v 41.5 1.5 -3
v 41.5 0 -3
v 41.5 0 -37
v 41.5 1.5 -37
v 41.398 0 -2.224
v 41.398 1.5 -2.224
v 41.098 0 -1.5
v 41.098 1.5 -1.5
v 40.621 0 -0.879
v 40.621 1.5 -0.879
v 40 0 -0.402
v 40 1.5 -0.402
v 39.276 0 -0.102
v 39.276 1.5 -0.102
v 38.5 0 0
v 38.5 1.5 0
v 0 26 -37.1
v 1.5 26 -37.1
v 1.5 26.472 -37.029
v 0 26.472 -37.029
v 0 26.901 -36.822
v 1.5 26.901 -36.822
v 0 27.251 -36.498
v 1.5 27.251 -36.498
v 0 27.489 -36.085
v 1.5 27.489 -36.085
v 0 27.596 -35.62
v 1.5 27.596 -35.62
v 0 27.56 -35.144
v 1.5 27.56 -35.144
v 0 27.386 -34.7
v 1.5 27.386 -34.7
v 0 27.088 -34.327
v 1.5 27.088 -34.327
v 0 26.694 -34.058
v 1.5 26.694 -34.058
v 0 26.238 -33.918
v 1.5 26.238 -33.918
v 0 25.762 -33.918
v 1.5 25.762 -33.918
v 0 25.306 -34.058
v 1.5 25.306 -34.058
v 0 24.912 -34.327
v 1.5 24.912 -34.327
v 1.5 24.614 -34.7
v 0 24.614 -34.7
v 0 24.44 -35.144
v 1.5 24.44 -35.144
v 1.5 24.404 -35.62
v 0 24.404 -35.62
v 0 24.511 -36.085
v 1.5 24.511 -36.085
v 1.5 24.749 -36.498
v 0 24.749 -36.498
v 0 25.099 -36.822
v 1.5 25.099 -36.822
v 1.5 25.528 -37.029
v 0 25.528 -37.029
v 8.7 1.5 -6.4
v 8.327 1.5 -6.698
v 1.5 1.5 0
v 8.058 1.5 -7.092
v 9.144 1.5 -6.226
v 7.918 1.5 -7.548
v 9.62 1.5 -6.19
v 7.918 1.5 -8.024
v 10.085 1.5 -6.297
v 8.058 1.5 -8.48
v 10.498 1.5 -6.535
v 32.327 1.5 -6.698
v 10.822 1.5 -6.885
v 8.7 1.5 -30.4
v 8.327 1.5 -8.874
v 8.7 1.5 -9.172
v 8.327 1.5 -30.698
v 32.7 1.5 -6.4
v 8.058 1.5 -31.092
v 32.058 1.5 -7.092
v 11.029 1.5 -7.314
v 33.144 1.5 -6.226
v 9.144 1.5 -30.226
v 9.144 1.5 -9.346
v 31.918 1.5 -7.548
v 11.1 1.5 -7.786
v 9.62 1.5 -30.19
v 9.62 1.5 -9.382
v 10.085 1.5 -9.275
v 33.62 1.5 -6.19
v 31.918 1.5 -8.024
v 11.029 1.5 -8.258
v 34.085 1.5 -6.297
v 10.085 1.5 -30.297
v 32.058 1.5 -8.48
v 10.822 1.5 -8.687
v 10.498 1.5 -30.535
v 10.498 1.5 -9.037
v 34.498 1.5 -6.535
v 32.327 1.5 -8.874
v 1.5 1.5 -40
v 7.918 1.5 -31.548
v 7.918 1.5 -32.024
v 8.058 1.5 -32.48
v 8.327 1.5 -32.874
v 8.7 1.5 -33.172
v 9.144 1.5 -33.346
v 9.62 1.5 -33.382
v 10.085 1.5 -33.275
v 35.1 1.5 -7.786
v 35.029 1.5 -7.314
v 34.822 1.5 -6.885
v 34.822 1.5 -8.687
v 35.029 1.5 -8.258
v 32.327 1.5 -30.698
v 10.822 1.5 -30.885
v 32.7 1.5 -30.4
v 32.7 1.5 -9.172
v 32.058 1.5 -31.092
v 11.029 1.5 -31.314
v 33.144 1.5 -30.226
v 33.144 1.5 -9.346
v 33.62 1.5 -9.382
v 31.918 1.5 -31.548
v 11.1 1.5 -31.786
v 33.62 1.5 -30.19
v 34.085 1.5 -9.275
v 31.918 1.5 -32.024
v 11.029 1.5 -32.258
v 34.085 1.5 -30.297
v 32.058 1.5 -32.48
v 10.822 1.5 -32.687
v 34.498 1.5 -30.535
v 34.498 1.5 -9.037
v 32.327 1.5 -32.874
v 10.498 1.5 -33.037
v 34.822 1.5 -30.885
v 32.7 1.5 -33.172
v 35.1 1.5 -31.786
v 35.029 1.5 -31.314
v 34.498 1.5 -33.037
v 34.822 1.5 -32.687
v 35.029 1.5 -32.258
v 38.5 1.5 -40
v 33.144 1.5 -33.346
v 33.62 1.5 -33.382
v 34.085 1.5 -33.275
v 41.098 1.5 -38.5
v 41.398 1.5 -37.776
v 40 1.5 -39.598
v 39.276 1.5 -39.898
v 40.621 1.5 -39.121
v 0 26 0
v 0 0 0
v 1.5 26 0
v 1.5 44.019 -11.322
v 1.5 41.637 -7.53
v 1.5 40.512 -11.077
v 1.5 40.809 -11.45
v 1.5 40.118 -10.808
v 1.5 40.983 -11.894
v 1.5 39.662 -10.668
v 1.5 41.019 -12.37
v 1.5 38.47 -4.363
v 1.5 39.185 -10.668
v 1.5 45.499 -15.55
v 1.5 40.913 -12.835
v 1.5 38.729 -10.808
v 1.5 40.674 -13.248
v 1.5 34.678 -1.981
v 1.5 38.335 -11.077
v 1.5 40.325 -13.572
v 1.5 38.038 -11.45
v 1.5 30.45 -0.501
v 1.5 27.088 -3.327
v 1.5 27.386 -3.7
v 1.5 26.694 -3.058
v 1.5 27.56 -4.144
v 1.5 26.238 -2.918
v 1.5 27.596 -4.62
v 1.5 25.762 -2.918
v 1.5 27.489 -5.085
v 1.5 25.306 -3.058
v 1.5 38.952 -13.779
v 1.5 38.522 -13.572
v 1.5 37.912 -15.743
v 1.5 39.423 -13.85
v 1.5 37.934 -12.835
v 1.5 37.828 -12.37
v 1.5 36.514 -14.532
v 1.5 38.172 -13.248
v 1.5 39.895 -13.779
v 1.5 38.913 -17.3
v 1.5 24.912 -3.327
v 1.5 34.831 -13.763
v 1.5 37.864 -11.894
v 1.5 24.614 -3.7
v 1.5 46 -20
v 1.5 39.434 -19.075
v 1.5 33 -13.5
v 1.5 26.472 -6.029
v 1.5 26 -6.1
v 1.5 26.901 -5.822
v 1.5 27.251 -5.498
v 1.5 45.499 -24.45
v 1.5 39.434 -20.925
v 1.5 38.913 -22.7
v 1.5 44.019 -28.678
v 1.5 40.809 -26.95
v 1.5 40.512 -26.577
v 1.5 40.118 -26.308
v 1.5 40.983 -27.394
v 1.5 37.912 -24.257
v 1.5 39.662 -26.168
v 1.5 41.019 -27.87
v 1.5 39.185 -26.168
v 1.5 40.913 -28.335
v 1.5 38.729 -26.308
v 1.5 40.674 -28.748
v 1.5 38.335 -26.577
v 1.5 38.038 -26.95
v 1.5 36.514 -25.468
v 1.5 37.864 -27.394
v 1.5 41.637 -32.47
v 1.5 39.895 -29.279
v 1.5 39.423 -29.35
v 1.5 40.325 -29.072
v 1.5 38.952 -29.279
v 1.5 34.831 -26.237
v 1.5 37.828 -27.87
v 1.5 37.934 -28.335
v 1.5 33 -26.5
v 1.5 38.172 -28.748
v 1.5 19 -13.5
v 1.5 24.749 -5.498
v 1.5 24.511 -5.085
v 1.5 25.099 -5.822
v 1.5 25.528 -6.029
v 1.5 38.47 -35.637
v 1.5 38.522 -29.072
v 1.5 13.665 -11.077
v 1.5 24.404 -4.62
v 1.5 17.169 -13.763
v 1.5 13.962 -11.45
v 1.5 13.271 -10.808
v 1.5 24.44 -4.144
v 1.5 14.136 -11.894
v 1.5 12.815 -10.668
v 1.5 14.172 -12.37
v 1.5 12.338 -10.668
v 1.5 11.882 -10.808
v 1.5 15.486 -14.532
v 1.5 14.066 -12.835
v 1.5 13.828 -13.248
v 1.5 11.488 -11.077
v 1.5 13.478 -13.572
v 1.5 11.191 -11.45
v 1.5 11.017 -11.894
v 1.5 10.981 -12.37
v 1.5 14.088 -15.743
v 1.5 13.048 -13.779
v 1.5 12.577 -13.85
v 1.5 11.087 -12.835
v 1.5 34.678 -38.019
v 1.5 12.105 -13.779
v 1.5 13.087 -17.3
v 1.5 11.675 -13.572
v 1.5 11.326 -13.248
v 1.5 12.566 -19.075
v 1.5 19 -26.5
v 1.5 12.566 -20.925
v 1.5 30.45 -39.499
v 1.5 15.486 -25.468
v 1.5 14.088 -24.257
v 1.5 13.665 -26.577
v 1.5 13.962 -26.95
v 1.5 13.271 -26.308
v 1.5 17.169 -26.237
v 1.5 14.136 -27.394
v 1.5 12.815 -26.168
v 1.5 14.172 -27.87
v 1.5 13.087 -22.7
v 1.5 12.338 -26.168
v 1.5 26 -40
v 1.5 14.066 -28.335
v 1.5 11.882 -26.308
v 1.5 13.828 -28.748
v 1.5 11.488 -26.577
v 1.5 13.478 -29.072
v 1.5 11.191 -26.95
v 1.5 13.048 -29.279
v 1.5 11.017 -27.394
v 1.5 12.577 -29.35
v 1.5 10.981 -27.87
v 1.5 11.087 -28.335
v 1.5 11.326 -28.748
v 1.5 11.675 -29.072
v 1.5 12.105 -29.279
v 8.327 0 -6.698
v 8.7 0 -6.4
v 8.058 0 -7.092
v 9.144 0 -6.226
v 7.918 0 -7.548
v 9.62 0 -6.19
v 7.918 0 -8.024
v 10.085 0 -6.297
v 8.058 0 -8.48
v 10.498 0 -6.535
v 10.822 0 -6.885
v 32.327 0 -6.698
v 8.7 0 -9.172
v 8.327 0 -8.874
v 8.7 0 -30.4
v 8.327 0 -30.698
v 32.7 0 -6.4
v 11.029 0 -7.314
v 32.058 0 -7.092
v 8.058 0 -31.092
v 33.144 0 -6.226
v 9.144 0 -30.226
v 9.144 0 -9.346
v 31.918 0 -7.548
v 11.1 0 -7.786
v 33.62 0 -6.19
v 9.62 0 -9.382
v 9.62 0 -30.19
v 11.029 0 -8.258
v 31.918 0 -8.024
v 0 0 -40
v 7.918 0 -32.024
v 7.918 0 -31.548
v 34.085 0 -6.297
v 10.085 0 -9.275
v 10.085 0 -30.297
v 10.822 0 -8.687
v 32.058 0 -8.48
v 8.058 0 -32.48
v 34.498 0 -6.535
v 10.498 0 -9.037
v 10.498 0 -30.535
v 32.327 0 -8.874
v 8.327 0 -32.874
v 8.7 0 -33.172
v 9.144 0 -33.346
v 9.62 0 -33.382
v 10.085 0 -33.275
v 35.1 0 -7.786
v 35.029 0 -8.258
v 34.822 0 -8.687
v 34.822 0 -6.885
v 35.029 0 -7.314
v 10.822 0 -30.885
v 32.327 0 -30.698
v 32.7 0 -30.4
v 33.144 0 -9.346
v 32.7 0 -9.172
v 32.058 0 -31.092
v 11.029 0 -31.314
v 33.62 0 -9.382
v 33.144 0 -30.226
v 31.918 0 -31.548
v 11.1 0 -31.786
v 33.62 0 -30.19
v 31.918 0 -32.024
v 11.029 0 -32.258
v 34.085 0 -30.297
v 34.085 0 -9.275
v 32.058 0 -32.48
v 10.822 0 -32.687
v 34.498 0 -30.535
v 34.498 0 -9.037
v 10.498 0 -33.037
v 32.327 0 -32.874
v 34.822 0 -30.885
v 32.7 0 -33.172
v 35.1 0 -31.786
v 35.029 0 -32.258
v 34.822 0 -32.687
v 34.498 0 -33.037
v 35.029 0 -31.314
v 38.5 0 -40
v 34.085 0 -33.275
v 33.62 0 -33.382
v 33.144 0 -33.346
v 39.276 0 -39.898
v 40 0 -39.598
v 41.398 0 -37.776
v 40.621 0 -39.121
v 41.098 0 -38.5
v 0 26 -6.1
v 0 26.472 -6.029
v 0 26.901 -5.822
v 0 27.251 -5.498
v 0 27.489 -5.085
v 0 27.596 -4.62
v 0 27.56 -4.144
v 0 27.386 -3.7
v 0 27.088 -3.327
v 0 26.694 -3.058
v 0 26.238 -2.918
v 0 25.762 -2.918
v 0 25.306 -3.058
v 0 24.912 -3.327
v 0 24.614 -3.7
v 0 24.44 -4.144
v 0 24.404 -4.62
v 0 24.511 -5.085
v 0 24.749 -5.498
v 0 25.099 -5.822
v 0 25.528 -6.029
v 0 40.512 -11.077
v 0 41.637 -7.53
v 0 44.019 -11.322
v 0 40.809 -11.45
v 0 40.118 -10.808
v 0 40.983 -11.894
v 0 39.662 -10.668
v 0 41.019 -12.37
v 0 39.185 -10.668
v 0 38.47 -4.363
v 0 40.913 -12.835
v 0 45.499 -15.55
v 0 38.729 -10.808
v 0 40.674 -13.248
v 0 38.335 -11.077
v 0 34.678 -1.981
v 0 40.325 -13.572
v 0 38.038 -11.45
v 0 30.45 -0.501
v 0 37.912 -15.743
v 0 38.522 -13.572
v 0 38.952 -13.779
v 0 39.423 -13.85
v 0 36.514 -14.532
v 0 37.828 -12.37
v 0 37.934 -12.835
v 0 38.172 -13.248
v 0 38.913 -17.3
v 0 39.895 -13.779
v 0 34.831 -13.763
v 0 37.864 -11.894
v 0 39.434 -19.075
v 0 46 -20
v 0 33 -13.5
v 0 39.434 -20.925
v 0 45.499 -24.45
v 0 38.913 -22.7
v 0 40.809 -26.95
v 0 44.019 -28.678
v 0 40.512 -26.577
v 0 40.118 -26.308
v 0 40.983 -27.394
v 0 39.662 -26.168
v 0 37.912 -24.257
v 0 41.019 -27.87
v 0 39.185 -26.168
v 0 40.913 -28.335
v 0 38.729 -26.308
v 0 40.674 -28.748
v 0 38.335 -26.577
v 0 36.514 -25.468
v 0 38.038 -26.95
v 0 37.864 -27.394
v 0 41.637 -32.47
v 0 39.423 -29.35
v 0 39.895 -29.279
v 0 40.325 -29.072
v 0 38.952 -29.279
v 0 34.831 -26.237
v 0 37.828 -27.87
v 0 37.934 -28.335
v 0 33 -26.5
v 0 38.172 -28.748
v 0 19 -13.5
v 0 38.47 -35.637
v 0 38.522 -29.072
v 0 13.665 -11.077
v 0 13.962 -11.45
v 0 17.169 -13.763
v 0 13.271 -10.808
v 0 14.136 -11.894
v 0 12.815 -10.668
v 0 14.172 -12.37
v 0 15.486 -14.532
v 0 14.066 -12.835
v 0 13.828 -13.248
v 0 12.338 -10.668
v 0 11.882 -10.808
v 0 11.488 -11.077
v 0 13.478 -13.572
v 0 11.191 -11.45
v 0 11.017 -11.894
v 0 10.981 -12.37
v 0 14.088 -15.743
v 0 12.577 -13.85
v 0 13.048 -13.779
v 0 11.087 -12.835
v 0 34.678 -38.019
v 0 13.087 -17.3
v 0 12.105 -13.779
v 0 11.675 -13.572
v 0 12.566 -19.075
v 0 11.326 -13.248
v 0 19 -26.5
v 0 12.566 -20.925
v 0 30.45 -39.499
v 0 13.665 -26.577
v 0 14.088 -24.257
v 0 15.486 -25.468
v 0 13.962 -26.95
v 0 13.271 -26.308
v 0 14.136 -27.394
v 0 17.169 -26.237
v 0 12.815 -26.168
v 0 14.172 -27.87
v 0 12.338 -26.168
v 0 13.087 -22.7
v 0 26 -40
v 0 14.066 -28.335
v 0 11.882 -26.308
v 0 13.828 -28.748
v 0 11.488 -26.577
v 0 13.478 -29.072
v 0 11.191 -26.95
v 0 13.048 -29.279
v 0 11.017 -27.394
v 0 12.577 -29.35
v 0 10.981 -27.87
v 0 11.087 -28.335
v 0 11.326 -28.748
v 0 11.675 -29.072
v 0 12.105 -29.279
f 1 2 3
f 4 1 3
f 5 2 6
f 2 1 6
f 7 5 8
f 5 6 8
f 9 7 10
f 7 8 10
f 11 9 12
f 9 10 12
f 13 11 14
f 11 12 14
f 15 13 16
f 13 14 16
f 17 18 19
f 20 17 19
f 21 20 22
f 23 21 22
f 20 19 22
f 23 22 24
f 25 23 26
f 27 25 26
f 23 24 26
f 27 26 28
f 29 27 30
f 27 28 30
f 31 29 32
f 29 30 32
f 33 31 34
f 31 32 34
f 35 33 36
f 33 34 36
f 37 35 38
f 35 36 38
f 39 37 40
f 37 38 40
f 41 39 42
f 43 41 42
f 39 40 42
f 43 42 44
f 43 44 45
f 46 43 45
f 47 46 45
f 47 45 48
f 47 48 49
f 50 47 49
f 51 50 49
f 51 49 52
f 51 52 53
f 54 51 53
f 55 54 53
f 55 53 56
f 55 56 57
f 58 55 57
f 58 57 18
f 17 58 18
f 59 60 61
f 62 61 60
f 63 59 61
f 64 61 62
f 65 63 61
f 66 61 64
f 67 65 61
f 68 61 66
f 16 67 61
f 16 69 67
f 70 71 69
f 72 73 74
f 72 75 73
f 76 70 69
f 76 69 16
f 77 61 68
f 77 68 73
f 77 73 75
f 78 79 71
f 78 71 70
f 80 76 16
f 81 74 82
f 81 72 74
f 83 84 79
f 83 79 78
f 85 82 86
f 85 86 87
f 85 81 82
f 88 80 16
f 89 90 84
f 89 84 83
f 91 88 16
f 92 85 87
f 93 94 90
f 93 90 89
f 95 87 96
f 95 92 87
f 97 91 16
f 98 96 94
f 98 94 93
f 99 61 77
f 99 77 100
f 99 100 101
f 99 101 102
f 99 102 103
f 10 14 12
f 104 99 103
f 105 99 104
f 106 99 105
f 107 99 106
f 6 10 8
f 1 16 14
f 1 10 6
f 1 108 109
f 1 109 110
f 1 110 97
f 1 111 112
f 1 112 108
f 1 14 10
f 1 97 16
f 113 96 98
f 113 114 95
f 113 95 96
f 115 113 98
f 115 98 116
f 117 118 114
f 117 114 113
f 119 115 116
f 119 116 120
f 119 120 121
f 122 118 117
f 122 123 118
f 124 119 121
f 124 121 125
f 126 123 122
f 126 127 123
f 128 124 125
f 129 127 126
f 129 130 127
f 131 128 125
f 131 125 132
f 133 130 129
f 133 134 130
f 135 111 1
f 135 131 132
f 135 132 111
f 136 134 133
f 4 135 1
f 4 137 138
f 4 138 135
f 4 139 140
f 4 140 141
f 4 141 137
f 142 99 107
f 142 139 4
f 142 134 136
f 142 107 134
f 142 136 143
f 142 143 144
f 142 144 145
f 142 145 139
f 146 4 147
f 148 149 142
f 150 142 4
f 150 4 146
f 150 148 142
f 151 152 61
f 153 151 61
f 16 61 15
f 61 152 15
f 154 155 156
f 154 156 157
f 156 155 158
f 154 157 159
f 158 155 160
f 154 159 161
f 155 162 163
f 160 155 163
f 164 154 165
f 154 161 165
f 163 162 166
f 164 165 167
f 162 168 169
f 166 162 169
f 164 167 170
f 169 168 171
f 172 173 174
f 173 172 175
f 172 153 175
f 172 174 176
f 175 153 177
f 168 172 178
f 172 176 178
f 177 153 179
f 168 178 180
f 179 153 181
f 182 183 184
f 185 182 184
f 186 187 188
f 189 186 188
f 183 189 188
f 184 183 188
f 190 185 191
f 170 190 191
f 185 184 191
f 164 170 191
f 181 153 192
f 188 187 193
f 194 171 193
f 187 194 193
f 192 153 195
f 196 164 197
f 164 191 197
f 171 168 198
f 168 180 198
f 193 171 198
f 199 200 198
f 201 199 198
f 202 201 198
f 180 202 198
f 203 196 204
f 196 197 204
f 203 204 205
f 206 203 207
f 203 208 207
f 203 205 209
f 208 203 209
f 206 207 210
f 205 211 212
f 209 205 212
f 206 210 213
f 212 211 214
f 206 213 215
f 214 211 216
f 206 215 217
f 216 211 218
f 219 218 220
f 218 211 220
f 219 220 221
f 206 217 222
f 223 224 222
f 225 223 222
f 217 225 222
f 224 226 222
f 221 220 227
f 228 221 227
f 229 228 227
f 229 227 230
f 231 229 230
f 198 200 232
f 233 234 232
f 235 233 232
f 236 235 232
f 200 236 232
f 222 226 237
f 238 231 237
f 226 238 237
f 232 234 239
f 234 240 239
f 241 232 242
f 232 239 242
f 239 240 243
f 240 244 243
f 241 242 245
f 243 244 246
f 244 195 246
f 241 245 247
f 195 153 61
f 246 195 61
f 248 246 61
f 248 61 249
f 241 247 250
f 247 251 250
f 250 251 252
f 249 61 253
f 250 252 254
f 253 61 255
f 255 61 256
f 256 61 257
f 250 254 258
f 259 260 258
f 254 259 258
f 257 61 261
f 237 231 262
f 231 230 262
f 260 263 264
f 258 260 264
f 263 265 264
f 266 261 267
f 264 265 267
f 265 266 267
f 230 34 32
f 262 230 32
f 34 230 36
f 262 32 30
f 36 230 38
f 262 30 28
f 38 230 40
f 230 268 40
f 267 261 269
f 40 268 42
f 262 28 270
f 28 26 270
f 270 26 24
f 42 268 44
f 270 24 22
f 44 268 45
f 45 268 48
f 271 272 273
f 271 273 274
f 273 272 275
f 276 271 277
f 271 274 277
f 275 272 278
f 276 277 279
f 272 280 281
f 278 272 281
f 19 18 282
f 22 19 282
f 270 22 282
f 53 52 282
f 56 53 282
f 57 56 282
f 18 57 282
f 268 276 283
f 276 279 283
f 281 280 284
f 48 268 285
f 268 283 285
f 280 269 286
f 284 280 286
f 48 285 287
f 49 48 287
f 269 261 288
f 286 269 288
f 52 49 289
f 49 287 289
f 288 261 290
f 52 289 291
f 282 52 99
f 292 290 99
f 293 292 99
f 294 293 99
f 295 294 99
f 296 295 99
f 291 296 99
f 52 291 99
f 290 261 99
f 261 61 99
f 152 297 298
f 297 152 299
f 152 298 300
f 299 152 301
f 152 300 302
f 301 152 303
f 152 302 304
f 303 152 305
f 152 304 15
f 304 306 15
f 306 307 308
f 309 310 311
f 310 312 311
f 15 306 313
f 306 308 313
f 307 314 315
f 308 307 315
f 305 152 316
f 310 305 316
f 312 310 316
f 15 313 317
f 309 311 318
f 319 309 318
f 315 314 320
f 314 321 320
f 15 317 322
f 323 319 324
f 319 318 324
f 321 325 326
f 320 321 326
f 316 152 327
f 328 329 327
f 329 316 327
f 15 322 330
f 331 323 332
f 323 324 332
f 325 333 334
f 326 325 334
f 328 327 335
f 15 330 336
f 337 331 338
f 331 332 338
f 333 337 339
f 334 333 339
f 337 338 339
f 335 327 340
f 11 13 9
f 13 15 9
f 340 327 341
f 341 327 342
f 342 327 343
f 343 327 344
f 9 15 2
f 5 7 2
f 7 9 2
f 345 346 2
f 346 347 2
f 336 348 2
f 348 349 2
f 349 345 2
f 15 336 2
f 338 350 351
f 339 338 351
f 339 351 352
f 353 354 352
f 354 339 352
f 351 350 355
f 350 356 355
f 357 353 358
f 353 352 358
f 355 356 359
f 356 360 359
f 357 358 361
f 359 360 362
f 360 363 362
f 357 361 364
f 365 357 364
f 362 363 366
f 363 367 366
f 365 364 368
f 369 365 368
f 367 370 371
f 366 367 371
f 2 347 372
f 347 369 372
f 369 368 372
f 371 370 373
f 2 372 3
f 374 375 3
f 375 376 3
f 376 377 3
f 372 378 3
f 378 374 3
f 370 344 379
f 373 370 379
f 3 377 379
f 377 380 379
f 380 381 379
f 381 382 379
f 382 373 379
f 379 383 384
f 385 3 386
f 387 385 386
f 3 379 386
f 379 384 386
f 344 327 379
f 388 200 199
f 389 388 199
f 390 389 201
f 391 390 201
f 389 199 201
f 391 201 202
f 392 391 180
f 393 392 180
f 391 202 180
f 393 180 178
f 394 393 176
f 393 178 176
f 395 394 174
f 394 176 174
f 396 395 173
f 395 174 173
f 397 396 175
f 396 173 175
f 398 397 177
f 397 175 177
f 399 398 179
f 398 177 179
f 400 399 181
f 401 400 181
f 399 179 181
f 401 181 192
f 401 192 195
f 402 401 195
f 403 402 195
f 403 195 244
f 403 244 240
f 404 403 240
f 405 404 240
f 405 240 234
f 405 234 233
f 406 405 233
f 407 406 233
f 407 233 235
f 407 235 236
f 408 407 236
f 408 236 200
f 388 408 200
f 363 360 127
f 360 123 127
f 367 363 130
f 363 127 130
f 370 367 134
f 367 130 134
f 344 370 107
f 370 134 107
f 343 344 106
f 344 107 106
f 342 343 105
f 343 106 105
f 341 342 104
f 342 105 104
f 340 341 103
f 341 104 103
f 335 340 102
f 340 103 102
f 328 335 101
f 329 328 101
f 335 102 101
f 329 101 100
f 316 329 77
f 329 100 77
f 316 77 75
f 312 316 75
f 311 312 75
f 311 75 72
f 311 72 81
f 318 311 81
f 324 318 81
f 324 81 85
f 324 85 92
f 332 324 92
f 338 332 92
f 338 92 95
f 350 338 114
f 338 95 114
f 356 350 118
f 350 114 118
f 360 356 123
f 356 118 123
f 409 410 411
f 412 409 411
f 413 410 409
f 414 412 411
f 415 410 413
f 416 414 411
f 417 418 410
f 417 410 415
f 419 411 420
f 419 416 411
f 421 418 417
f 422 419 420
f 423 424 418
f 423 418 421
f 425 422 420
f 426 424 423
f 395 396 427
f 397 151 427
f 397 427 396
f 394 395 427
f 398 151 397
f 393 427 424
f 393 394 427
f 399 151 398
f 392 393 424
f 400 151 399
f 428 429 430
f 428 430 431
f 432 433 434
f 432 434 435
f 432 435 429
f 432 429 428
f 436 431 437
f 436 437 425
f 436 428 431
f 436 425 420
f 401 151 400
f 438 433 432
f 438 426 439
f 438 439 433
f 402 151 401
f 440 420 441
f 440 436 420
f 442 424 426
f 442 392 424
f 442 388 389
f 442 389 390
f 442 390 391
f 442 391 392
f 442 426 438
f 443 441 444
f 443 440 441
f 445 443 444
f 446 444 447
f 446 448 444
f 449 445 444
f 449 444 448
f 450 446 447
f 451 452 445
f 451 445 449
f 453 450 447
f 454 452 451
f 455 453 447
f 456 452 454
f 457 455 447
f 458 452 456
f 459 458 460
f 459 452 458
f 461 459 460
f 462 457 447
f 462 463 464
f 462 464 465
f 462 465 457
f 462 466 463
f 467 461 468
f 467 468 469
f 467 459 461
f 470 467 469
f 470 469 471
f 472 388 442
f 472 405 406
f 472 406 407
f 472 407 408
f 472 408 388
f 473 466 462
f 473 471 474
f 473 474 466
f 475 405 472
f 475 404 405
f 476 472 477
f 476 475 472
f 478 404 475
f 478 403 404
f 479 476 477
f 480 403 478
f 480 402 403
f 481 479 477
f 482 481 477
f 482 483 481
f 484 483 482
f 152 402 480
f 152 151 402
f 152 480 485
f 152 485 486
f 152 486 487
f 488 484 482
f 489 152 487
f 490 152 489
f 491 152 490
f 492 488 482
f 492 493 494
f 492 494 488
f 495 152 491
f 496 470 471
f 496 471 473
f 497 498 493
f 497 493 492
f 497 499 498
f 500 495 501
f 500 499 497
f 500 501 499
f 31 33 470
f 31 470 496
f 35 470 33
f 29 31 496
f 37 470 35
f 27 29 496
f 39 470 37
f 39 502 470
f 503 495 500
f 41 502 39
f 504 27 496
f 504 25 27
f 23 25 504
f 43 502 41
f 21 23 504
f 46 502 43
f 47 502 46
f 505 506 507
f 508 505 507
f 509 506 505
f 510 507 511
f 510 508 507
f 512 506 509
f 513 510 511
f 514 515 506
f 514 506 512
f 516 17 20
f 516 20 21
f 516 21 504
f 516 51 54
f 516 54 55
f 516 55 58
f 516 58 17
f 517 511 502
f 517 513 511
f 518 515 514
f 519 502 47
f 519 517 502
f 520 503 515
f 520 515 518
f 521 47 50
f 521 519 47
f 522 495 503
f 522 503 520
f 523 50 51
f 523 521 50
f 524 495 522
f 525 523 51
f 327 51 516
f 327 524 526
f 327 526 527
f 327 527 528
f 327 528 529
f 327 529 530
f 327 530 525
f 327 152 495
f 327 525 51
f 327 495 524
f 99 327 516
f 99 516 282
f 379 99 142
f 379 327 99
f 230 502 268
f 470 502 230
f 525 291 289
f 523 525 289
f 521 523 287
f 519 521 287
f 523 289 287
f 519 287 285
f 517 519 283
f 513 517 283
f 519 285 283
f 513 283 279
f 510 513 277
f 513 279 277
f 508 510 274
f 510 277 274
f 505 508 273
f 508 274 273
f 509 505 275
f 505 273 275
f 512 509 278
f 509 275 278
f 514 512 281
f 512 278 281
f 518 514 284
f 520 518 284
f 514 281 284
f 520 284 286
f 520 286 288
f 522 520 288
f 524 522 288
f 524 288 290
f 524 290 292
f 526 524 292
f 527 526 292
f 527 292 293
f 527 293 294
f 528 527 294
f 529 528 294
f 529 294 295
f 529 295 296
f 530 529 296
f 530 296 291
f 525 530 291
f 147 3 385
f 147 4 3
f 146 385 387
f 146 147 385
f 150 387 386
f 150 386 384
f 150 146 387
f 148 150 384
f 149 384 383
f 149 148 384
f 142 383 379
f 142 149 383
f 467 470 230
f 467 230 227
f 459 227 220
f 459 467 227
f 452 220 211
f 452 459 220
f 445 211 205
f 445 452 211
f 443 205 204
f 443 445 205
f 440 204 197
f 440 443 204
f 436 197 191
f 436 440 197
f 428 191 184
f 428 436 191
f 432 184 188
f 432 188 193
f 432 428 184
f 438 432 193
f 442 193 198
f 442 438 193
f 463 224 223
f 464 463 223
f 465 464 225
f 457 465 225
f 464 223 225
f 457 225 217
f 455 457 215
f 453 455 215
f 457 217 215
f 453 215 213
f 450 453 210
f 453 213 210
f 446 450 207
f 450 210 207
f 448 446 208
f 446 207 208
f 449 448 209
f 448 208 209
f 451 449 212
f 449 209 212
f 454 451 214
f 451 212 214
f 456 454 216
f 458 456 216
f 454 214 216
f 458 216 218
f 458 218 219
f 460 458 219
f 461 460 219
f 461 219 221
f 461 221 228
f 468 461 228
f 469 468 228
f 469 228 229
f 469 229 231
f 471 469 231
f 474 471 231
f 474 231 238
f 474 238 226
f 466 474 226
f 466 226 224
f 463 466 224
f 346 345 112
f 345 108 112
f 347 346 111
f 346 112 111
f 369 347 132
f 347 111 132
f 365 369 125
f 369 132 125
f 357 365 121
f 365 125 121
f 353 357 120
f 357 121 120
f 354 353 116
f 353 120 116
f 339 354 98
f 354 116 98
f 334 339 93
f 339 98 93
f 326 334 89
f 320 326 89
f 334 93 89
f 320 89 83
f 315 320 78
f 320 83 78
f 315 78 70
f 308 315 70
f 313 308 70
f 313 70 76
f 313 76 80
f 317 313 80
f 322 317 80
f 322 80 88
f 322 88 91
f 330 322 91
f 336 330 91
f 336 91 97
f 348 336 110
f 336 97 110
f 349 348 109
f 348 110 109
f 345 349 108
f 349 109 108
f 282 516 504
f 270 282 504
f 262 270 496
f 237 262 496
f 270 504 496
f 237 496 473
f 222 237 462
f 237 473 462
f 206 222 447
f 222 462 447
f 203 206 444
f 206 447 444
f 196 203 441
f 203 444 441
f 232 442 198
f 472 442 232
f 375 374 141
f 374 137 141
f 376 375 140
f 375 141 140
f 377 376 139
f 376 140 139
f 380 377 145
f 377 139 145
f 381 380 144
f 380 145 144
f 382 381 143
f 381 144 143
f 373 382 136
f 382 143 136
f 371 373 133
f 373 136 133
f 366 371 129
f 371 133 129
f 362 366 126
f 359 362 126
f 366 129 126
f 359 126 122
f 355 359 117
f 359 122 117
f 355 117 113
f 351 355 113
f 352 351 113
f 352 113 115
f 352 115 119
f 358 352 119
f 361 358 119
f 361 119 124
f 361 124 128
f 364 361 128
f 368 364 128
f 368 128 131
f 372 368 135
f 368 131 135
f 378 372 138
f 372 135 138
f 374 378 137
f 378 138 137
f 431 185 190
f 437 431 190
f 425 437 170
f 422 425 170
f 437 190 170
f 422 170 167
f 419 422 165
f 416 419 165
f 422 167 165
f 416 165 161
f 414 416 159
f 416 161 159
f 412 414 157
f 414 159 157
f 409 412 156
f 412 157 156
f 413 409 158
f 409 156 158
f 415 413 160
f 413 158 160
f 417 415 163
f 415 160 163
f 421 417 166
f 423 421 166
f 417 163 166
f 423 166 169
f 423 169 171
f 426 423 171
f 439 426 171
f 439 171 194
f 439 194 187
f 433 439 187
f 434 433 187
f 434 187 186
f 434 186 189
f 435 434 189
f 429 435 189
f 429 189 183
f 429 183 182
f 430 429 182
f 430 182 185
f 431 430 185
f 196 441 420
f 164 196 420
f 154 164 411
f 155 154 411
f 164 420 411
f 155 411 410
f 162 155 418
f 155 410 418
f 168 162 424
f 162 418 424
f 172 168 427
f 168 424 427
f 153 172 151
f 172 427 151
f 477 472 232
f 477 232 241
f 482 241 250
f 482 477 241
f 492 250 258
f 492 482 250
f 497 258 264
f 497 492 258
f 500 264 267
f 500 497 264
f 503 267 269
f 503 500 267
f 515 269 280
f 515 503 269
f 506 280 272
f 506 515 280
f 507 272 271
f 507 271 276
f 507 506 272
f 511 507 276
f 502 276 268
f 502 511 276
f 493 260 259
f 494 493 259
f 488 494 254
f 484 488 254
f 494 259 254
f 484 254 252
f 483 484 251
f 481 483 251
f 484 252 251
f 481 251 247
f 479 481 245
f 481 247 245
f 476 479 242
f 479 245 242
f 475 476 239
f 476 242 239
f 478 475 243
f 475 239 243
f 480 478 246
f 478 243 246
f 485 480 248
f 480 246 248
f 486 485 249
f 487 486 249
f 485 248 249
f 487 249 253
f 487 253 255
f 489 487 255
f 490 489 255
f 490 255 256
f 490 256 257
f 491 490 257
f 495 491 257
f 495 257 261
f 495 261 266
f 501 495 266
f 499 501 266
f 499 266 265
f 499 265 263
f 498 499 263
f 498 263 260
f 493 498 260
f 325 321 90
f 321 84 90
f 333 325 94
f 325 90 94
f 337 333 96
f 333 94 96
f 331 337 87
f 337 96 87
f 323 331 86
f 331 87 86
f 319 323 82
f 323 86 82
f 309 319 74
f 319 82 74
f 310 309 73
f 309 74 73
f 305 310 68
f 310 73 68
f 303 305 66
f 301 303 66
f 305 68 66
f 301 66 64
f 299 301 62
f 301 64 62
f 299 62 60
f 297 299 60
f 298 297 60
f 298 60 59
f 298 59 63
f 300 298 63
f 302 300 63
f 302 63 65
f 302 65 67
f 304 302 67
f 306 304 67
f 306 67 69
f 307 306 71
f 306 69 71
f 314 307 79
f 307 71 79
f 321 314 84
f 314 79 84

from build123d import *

# Parameters (mm, degrees)
SKETCH_1_W                  = 41.5
SKETCH_1_H                  = 40
EXTRUDE_1_DEPTH             = 1.5
SKETCH_2_W                  = 1.5
SKETCH_2_H                  = 40
EXTRUDE_2_DEPTH             = 44.5
CUT_EXTRUDE_1_DEPTH         = 1.5
HOLE_WIZARD_3_2_3_2_1_D     = 3.2
HOLE_WIZARD_3_2_3_2_2_D     = 3.2
HOLE_WIZARD_3_2_3_2_2_DEPTH = 1.5
HOLE_WIZARD_3_2_3_2_2_TIP   = 0.96137699
FILLET_1_R                  = 3


with BuildPart() as part:
    # 草图1 → 凸台-拉伸1 (new body)
    with BuildSketch(Plane(origin=(0, 0, 0), x_dir=(1, 0, 0), z_dir=(0, 1, 0))):
        with Locations((20.75, 20)):
            Rectangle(SKETCH_1_W, SKETCH_1_H)
    extrude(amount=EXTRUDE_1_DEPTH)

    # 草图2 → 凸台-拉伸2 (add)
    with BuildSketch(Plane(origin=(0, 1.5, 0), x_dir=(1, 0, 0), z_dir=(0, 1, 0))):
        with Locations((0.75, 20)):
            Rectangle(SKETCH_2_W, SKETCH_2_H)
    extrude(amount=EXTRUDE_2_DEPTH)

    # 草图3 → 切除-拉伸1 (cut)
    with BuildSketch(Plane.ZY):
        with BuildLine():
            Line((-40, 46), (-40, 26))
            ThreePointArc((-40, 26), (-34.142135624, 40.142135624), (-20, 46))
            Line((-20, 46), (-40, 46))
        make_face()
        with BuildLine():
            Line((0, 46), (-20, 46))
            ThreePointArc((-20, 46), (-5.857864376, 40.142135624), (0, 26))
            Line((0, 26), (0, 46))
        make_face()
        with BuildLine():
            Line((-26.5, 19), (-26.5, 33))
            ThreePointArc((-26.5, 33), (-20, 39.5), (-13.5, 33))
            Line((-13.5, 33), (-13.5, 19))
            ThreePointArc((-13.5, 19), (-20, 12.5), (-26.5, 19))
        make_face()
    extrude(amount=-CUT_EXTRUDE_1_DEPTH, mode=Mode.SUBTRACT)

    # Ø3.2 (3.2) 直径孔1 (through all)
    with Locations(Plane.ZY):
        with Locations((-12.25, 39.423393759), (-4.5, 26), (-12.25, 12.576606241), (-27.75, 12.576606241), (-35.5, 26), (-27.75, 39.423393759)):
            Hole(HOLE_WIZARD_3_2_3_2_1_D / 2)

    # Ø3.2 (3.2) 直径孔2
    with Locations(Plane(origin=(0, 0, 0), x_dir=(-1, 0, 0), z_dir=(0, -1, 0))):
        with Locations((-9.5, 31.786000063), (-33.5, 31.786000063), (-33.5, 7.786000063), (-9.5, 7.786000063)):
            Hole(HOLE_WIZARD_3_2_3_2_2_D / 2, depth=HOLE_WIZARD_3_2_3_2_2_DEPTH)
            with Locations((0, 0, -(HOLE_WIZARD_3_2_3_2_2_DEPTH + HOLE_WIZARD_3_2_3_2_2_TIP / 2))):  # 118° drill point
                Cone(0, HOLE_WIZARD_3_2_3_2_2_D / 2, HOLE_WIZARD_3_2_3_2_2_TIP, mode=Mode.SUBTRACT)

    # 圆角1
    fillet_1_edges = [part.edges().sort_by_distance(p)[0] for p in [
        (41.5, 0.75, -40),
        (41.5, 0.75, 0),
    ]]
    fillet(fillet_1_edges, radius=FILLET_1_R)


solid = part.part
